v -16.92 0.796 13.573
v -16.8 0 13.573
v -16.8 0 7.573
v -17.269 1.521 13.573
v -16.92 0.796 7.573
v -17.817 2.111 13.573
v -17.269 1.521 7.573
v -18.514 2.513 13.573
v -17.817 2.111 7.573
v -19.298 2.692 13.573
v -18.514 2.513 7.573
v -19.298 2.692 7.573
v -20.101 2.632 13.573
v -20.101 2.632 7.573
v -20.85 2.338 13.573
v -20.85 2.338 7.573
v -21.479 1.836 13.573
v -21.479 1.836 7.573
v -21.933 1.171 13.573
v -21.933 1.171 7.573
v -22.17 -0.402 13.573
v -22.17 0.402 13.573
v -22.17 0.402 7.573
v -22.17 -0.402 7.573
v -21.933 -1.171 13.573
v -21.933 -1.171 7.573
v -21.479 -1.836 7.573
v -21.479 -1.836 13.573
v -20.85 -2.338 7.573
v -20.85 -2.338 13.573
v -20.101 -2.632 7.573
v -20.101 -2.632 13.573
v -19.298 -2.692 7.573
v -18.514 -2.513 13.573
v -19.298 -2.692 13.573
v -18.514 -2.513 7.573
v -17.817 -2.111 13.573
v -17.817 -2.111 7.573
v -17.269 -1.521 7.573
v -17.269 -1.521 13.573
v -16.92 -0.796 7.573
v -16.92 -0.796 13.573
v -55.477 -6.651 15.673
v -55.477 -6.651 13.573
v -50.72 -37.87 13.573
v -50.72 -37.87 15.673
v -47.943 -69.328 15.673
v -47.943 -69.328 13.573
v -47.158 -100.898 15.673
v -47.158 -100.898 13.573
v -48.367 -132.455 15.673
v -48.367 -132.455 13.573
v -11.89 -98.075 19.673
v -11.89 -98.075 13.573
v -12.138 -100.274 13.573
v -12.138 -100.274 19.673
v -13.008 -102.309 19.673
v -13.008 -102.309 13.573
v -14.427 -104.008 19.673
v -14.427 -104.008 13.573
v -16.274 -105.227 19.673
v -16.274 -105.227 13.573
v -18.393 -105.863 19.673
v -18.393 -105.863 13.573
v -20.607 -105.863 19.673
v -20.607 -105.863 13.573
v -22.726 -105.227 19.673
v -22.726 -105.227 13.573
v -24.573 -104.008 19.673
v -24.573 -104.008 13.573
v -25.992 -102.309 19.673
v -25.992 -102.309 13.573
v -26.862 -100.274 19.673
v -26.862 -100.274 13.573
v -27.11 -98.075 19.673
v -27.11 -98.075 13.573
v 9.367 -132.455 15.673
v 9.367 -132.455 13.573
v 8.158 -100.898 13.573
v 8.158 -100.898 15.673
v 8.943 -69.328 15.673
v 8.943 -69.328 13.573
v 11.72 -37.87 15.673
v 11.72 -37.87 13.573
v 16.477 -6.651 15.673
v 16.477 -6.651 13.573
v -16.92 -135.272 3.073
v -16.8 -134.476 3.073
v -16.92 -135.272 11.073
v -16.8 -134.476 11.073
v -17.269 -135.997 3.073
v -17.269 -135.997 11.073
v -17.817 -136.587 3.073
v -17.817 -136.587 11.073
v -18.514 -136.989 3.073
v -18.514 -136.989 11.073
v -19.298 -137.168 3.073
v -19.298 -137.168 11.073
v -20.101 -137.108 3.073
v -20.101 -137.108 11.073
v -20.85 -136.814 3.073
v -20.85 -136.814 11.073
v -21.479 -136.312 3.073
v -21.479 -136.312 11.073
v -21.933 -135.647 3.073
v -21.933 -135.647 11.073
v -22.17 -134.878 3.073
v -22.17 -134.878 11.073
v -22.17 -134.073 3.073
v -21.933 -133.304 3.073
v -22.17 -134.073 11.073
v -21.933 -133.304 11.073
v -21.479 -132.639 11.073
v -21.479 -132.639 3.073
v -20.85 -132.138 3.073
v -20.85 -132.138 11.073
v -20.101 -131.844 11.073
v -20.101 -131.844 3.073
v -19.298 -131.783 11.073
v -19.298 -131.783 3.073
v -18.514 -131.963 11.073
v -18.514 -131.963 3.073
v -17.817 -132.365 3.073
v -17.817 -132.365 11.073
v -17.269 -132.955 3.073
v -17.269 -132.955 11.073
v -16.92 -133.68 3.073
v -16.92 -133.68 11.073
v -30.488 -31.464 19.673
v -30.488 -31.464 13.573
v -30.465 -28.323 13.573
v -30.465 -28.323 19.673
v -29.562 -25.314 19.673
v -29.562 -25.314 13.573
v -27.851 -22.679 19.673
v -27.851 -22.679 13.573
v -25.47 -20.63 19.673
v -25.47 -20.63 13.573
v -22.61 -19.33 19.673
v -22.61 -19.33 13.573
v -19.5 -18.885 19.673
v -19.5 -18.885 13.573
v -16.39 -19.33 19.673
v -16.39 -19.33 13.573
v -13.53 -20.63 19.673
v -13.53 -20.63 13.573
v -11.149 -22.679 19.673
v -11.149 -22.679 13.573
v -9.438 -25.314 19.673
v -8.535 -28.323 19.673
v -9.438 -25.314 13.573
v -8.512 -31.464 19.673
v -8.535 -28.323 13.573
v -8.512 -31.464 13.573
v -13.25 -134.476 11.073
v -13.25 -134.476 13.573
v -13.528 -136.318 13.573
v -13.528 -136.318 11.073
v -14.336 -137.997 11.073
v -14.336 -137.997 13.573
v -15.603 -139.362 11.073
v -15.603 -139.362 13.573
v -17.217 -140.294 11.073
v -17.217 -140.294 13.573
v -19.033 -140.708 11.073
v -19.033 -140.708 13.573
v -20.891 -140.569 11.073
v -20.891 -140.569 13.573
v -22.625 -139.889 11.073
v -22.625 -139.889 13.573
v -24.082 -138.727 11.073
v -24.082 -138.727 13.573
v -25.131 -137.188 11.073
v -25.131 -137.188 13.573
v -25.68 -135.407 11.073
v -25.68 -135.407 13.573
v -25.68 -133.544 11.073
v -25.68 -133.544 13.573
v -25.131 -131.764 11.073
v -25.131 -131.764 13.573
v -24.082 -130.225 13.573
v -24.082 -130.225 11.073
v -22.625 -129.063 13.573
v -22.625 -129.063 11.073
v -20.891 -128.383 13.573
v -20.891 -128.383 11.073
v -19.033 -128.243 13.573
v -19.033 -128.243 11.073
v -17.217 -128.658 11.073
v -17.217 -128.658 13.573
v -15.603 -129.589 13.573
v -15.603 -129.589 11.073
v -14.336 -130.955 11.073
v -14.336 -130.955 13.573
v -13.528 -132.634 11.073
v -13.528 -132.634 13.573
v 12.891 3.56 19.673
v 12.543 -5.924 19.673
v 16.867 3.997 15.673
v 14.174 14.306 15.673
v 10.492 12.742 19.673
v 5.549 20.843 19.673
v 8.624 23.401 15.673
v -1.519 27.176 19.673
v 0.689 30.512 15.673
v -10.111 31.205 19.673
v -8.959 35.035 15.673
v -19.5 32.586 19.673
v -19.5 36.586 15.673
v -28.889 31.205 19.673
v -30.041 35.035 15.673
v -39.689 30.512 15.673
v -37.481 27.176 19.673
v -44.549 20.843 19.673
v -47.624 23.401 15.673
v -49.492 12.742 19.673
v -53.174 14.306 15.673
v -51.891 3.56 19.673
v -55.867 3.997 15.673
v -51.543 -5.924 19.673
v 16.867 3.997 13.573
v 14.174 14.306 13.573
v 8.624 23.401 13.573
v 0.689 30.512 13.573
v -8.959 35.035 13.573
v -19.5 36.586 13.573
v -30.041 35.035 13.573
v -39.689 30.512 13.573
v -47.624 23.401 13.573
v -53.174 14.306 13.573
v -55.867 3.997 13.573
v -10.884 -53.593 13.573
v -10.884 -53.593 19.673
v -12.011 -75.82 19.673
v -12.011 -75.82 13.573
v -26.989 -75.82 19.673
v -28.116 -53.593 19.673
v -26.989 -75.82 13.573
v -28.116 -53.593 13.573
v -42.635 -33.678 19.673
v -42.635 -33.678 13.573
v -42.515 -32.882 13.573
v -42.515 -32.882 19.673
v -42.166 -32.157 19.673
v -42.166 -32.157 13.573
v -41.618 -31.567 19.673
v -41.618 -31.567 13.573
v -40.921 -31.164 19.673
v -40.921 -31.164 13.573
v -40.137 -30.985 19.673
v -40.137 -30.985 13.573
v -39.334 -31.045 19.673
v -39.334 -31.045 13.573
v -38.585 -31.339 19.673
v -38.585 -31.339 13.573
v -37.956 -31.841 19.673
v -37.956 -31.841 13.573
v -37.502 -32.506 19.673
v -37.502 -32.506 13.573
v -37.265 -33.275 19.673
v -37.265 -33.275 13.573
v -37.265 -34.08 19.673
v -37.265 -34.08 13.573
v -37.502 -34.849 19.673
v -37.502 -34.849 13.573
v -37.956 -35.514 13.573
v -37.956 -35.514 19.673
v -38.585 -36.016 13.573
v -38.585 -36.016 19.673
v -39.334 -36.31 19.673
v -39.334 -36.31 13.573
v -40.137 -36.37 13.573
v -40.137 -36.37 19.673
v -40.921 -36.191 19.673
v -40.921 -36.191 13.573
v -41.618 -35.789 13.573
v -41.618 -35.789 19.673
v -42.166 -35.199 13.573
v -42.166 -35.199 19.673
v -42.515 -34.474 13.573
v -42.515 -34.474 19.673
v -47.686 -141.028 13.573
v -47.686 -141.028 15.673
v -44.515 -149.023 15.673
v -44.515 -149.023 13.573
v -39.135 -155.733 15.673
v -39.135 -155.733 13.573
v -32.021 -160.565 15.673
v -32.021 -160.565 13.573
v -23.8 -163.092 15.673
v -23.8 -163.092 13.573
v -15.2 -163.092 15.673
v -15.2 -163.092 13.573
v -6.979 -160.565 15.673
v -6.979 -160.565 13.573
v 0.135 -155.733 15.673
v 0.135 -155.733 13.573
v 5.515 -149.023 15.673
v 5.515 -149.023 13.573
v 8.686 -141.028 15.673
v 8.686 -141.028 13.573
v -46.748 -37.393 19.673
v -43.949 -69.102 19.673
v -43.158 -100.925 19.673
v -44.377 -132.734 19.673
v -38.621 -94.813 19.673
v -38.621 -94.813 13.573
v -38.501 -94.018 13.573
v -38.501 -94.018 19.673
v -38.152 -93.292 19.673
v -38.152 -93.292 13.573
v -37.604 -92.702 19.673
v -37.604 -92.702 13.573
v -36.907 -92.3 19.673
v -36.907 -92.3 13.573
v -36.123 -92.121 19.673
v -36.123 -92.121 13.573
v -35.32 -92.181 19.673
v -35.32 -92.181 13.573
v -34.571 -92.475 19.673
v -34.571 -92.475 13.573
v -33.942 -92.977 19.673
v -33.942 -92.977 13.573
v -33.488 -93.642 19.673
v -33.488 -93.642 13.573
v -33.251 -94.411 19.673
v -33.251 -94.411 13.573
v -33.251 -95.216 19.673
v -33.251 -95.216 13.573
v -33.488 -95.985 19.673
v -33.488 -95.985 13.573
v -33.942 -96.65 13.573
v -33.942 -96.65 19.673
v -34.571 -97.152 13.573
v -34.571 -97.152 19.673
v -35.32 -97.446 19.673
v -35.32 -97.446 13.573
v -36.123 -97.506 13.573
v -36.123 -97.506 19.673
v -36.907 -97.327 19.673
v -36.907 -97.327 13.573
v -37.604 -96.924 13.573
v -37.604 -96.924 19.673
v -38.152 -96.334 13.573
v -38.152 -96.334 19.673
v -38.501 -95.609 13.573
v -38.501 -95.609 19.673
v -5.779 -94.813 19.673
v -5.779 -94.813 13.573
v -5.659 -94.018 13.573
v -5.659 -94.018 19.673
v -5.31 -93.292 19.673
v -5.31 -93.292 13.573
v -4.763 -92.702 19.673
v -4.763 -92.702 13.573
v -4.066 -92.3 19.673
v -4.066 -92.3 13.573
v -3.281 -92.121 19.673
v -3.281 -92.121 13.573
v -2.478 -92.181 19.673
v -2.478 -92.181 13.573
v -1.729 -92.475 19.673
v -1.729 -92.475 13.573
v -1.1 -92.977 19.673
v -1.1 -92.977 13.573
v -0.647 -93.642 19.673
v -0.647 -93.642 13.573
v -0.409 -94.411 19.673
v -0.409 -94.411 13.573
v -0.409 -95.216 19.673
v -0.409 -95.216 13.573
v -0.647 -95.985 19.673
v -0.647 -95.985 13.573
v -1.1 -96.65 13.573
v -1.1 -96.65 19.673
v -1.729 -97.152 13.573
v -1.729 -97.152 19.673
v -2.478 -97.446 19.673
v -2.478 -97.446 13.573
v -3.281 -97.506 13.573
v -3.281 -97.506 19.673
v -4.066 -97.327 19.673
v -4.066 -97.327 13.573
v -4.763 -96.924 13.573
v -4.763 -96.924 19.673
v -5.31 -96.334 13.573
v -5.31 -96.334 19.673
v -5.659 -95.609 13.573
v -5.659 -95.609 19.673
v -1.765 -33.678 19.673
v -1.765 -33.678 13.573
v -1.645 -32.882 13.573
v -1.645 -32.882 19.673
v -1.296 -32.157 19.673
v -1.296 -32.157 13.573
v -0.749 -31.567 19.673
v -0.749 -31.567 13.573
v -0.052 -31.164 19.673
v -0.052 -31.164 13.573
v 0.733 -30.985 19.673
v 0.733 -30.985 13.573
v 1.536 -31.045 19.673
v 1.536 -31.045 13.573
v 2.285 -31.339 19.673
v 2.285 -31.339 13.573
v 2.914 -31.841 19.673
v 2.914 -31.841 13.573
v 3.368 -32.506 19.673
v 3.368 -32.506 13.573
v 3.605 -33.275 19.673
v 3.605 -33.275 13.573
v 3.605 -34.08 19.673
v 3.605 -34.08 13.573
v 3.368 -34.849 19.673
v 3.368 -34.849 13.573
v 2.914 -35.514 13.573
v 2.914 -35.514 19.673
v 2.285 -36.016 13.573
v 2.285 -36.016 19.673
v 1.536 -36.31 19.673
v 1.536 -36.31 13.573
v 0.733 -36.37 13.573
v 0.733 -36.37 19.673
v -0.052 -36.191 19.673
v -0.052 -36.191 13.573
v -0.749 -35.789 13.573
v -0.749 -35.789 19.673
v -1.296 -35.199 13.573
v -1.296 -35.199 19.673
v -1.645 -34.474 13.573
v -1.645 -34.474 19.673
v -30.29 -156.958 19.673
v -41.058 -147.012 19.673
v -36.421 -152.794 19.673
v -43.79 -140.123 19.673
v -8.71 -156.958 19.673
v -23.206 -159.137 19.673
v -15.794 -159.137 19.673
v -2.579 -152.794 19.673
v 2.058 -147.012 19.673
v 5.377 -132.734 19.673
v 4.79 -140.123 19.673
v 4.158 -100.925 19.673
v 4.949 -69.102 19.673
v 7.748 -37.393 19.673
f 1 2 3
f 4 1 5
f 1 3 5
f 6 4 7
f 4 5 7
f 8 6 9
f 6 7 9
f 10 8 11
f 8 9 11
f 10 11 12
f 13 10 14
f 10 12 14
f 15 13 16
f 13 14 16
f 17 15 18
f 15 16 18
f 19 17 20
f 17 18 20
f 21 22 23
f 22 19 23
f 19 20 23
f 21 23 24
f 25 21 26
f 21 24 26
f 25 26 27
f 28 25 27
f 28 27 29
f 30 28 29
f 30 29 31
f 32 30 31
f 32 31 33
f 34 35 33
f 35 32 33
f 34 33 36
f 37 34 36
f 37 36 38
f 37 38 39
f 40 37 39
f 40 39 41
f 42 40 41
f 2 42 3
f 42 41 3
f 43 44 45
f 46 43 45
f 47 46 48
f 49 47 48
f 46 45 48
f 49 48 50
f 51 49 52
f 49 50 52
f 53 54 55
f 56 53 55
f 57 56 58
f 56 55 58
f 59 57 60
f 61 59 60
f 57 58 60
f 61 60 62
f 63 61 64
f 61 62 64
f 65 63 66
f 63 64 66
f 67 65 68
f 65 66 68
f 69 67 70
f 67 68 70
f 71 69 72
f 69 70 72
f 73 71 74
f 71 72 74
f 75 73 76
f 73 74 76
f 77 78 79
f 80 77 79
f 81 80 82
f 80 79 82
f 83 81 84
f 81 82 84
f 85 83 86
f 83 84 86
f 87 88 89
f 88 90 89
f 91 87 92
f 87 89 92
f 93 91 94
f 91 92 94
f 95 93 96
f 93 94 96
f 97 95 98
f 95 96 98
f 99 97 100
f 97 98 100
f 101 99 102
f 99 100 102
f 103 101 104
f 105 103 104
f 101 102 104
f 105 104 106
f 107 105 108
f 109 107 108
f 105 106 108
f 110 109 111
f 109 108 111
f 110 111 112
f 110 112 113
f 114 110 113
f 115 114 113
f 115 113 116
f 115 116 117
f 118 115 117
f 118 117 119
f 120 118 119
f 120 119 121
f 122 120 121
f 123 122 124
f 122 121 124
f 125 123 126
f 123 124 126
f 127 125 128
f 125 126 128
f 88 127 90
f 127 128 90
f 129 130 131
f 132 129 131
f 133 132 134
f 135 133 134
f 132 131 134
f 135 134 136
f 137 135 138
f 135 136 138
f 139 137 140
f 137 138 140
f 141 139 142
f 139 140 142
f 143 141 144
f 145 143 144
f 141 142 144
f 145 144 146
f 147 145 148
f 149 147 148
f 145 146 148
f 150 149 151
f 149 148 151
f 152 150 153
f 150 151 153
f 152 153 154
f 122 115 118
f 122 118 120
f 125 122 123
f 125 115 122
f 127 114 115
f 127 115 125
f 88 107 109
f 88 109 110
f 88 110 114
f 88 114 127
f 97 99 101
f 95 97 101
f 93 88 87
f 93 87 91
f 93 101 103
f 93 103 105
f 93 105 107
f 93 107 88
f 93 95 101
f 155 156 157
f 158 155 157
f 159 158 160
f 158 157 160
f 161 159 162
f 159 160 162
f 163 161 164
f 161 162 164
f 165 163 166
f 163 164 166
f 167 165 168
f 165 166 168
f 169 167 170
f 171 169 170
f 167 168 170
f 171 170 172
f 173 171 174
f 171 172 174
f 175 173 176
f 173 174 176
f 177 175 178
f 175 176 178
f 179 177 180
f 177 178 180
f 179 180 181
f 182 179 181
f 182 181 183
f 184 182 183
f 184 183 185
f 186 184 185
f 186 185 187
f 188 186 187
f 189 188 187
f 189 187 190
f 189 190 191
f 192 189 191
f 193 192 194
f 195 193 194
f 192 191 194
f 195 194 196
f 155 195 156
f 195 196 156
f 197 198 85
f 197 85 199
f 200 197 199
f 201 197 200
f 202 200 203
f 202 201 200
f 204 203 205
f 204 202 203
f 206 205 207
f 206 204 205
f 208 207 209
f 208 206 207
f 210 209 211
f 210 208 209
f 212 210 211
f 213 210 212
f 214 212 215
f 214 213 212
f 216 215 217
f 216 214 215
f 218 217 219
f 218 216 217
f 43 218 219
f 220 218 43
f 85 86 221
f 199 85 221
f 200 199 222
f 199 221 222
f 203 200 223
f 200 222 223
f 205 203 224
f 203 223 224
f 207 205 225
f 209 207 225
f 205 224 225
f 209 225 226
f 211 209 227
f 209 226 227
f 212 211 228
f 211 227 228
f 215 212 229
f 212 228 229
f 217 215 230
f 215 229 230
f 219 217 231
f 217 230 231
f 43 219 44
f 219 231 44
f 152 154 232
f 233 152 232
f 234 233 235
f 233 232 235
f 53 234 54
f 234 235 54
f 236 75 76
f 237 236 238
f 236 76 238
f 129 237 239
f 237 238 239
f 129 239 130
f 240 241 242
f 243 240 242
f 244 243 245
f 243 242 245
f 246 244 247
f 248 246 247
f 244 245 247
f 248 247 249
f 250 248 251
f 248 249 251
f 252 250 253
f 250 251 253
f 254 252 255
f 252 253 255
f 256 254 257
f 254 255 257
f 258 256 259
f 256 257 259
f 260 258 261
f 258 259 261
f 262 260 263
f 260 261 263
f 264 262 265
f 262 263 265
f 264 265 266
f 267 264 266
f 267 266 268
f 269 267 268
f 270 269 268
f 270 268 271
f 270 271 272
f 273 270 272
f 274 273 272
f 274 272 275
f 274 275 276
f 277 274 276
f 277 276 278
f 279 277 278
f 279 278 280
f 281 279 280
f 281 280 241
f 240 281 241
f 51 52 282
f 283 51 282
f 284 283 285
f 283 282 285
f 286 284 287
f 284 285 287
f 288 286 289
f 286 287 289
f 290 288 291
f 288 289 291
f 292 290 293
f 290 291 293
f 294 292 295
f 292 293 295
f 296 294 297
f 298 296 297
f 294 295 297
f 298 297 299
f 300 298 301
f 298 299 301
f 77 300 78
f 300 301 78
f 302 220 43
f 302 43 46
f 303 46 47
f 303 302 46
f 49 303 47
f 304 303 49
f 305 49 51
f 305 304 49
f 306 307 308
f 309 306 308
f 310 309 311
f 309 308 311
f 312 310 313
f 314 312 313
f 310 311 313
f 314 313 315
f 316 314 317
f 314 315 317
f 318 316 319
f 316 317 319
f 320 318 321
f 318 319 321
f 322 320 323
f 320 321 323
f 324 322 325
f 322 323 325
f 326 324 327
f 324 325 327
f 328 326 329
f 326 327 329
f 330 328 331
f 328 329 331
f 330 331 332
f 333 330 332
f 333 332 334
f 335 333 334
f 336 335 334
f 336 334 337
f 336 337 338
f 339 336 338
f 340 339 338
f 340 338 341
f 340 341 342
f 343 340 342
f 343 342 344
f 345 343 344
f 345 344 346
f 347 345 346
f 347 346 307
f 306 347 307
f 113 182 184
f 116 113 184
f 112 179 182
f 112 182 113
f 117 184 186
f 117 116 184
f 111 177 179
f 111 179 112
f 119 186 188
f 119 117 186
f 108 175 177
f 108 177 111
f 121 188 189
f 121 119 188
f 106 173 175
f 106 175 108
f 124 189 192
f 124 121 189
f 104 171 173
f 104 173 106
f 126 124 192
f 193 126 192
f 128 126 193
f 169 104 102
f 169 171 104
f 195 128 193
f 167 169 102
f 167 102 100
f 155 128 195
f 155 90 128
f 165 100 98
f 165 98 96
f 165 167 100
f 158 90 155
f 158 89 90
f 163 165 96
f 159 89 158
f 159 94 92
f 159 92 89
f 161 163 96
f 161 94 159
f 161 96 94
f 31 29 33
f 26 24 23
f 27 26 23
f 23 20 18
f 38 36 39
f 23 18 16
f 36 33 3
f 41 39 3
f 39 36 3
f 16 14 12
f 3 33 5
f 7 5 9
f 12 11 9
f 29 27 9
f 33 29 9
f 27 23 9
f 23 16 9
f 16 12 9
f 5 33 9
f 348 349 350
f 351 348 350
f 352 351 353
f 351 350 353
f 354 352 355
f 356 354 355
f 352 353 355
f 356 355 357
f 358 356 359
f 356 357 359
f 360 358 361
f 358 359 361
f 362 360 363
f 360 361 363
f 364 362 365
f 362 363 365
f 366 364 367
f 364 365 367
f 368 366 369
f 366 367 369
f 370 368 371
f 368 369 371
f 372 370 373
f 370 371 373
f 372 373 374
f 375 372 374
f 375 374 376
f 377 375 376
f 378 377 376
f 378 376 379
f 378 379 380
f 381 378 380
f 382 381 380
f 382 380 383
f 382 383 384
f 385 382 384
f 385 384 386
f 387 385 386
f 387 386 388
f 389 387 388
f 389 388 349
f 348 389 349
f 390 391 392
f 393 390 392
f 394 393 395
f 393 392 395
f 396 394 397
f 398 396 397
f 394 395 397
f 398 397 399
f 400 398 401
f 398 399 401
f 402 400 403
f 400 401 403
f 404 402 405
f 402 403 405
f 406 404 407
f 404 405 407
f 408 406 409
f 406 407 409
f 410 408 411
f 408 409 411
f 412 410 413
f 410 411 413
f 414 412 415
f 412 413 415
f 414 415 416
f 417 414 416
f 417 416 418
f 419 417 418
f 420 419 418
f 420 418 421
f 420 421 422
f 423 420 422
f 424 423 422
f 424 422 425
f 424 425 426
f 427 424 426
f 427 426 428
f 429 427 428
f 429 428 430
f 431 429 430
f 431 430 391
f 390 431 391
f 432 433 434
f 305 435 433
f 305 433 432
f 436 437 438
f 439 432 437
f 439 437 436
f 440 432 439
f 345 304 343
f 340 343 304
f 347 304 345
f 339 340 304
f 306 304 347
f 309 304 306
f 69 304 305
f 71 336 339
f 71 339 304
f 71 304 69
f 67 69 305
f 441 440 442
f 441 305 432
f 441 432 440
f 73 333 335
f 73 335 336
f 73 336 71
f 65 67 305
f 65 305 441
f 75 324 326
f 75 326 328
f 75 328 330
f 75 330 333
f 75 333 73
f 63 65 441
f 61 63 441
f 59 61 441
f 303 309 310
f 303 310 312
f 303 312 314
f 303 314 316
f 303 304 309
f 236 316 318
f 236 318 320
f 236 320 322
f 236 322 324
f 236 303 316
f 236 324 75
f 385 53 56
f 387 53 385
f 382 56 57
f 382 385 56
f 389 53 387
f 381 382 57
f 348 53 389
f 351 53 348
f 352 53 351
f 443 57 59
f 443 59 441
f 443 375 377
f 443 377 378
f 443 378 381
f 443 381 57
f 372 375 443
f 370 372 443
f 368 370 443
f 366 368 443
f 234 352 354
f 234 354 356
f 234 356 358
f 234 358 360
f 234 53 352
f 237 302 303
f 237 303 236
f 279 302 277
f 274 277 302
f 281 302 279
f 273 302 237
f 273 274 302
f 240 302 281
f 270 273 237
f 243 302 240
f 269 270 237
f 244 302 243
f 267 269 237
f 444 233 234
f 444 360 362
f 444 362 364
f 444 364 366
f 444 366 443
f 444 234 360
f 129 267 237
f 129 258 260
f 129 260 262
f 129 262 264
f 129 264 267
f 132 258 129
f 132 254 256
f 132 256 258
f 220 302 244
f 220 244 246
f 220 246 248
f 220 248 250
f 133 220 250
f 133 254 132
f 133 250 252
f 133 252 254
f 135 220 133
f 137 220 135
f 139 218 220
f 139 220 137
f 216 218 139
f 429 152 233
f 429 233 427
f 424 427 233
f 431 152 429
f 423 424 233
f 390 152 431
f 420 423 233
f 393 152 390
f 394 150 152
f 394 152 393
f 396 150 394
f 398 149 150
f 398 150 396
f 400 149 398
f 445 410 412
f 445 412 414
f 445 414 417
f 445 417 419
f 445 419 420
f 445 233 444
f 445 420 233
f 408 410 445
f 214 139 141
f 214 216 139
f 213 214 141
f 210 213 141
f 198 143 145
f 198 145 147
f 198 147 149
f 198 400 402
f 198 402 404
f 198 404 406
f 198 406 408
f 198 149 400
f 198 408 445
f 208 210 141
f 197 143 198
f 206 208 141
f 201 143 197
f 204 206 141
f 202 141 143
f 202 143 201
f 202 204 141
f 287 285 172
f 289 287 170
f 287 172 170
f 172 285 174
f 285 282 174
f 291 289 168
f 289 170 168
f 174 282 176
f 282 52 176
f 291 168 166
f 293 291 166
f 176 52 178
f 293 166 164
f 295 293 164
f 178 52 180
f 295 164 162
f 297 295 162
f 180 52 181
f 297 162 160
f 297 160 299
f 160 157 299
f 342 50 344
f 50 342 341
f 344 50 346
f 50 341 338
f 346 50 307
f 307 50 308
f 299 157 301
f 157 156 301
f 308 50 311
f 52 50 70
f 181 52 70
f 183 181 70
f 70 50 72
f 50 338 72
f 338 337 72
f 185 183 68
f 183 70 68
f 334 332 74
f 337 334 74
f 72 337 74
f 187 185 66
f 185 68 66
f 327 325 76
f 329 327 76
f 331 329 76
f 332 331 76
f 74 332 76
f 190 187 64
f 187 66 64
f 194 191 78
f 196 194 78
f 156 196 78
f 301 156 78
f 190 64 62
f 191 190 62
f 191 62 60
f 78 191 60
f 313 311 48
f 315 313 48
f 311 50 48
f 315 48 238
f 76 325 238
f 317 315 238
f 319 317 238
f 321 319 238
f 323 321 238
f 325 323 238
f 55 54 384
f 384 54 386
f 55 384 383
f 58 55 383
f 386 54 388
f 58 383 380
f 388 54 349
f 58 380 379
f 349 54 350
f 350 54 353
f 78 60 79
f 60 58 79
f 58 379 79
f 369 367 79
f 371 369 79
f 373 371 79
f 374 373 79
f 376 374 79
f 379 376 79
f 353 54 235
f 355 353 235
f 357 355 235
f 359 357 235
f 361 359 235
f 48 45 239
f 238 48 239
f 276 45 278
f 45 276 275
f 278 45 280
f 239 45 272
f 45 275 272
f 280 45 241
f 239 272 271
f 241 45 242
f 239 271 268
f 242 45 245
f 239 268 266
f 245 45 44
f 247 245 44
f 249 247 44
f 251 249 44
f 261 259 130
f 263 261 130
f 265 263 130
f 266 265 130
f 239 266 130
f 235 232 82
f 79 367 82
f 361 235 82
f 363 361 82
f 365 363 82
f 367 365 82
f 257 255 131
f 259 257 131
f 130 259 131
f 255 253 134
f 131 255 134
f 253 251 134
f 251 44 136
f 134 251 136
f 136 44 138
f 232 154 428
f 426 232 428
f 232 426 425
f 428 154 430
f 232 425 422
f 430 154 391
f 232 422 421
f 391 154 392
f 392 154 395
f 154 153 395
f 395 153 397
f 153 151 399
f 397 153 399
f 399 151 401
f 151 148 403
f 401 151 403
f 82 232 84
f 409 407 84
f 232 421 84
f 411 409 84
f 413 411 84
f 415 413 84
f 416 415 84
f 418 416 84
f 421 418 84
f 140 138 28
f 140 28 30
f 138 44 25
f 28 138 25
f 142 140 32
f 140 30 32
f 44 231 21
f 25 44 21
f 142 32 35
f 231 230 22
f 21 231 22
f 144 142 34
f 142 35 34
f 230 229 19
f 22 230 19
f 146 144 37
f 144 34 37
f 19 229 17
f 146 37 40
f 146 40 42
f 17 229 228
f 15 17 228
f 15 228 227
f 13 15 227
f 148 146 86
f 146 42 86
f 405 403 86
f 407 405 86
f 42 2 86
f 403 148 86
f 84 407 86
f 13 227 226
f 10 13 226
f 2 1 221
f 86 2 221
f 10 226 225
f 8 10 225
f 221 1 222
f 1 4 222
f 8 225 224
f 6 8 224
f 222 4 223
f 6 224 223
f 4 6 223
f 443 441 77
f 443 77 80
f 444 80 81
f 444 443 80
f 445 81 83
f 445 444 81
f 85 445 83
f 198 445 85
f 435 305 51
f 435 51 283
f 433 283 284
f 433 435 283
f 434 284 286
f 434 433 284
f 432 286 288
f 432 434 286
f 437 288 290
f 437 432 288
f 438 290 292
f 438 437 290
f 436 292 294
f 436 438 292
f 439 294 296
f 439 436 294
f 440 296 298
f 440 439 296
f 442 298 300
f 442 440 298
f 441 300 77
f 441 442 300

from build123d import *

# Parameters (mm, degrees)
BOSS_EXTRUDE1_DEPTH      = 7
BOSS_EXTRUDE1_DEPTH_BACK = 5
SKETCH2_R                = 2.7
BOSS_EXTRUDE3_DEPTH      = 0.1
BOSS_EXTRUDE3_DEPTH_BACK = 6
CHAMFER1_SIZE            = 4
SKETCH5_R                = 2.7
BOSS_EXTRUDE4_DEPTH      = 6
CUT_EXTRUDE1_DEPTH       = 23
SKETCH7_R                = 2.7
CUT_EXTRUDE2_DEPTH       = 37
SKETCH8_R                = 6.25
BOSS_EXTRUDE5_DEPTH      = 2.5
SKETCH9_R                = 2.7
BOSS_EXTRUDE6_DEPTH      = 4.5


with BuildPart() as part:
    # Sketch2 → Boss-Extrude1 (new, two sides: drawn at the far end of the back side and taken through both)
    with BuildSketch(Plane.XY.offset(12.572663867).offset(-BOSS_EXTRUDE1_DEPTH_BACK)):
        with Locations((-19.5, 0)):
            Circle(SKETCH2_R)
    extrude(amount=BOSS_EXTRUDE1_DEPTH + BOSS_EXTRUDE1_DEPTH_BACK)

    # Sketch4 → Boss-Extrude3 (add, two sides: drawn at the far end of the back side and taken through both)
    with BuildSketch(Plane.XY.offset(19.572663867).offset(-BOSS_EXTRUDE3_DEPTH_BACK)):
        with BuildLine():
            ThreePointArc((16.476844134, -6.650636784), (-19.499999999, 36.586394787), (-55.476844134, -6.650636782))
            ThreePointArc((-55.476844134, -6.650636782), (-47.943109392, -69.328026103), (-48.367101444, -132.455140104))
            ThreePointArc((-48.367101444, -132.455140104), (-19.500000007, -163.413605213), (9.36710143, -132.455140104))
            ThreePointArc((9.36710143, -132.455140104), (8.943109385, -69.328026104), (16.476844134, -6.650636784))
        make_face()
    extrude(amount=BOSS_EXTRUDE3_DEPTH + BOSS_EXTRUDE3_DEPTH_BACK)

    # Chamfer1
    chamfer1_edges = [part.edges().sort_by_distance(p)[0] for p in [
        (-47.943109392, -69.328026103, 19.672663867),
        (-19.500000007, -163.413605213, 19.672663867),
        (8.943109385, -69.328026104, 19.672663867),
        (-19.499999999, 36.586394787, 19.672663867),
    ]]
    chamfer(chamfer1_edges, length=CHAMFER1_SIZE)

    # Sketch5 → Boss-Extrude4 (add)
    with BuildSketch(Plane(origin=(0, 0, 13.572663867), x_dir=(-1, 0, 0), z_dir=(0, 0, -1))):
        with Locations(Location((19.500000007, -134.475863937, 0), (0, 0, 180))):
            Circle(SKETCH5_R)
    extrude(amount=BOSS_EXTRUDE4_DEPTH)

    # Sketch6 → Cut-Extrude1 (cut)
    with BuildSketch(Plane(origin=(0, 0, 13.572663867), x_dir=(-1, 0, 0), z_dir=(0, 0, -1))):
        with BuildLine():
            ThreePointArc((30.487725375, -31.464034345), (19.500000001, -18.885340351), (8.512274628, -31.464034345))
            ThreePointArc((8.512274628, -31.464034345), (11.603309463, -64.698470815), (11.890013879, -98.075110316))
            ThreePointArc((11.890013879, -98.075110316), (19.500000005, -105.944284009), (27.109986131, -98.075110316))
            ThreePointArc((27.109986131, -98.075110316), (27.396690544, -64.698470815), (30.487725375, -31.464034345))
        make_face()
    extrude(amount=-CUT_EXTRUDE1_DEPTH, mode=Mode.SUBTRACT)

    # Sketch7 → Cut-Extrude2 (cut)
    with BuildSketch(Plane(origin=(0, 0, 13.572663867), x_dir=(-1, 0, 0), z_dir=(0, 0, -1))):
        with Locations((39.934899894, -33.677713254)):
            Circle(SKETCH7_R)
        with Locations((35.920760732, -94.813426318)):
            Circle(SKETCH7_R)
        with Locations((-0.934899891, -33.677713254)):
            Circle(SKETCH7_R)
        with Locations((3.079239271, -94.813426318)):
            Circle(SKETCH7_R)
    extrude(amount=-CUT_EXTRUDE2_DEPTH, mode=Mode.SUBTRACT)

    # Sketch8 → Boss-Extrude5 (add)
    with BuildSketch(Plane(origin=(0, 0, 13.572663867), x_dir=(-1, 0, 0), z_dir=(0, 0, -1))):
        with Locations(Location((19.500000007, -134.475863937, 0), (0, 0, 180))):
            Circle(SKETCH8_R)
    extrude(amount=BOSS_EXTRUDE5_DEPTH)

    # Sketch9 → Boss-Extrude6 (add)
    with BuildSketch(Plane(origin=(0, 0, 7.572663867), x_dir=(-1, 0, 0), z_dir=(0, 0, -1))):
        with Locations(Location((19.500000007, -134.475863937, 0), (0, 0, 180))):
            Circle(SKETCH9_R)
    extrude(amount=BOSS_EXTRUDE6_DEPTH)


solid = part.part
